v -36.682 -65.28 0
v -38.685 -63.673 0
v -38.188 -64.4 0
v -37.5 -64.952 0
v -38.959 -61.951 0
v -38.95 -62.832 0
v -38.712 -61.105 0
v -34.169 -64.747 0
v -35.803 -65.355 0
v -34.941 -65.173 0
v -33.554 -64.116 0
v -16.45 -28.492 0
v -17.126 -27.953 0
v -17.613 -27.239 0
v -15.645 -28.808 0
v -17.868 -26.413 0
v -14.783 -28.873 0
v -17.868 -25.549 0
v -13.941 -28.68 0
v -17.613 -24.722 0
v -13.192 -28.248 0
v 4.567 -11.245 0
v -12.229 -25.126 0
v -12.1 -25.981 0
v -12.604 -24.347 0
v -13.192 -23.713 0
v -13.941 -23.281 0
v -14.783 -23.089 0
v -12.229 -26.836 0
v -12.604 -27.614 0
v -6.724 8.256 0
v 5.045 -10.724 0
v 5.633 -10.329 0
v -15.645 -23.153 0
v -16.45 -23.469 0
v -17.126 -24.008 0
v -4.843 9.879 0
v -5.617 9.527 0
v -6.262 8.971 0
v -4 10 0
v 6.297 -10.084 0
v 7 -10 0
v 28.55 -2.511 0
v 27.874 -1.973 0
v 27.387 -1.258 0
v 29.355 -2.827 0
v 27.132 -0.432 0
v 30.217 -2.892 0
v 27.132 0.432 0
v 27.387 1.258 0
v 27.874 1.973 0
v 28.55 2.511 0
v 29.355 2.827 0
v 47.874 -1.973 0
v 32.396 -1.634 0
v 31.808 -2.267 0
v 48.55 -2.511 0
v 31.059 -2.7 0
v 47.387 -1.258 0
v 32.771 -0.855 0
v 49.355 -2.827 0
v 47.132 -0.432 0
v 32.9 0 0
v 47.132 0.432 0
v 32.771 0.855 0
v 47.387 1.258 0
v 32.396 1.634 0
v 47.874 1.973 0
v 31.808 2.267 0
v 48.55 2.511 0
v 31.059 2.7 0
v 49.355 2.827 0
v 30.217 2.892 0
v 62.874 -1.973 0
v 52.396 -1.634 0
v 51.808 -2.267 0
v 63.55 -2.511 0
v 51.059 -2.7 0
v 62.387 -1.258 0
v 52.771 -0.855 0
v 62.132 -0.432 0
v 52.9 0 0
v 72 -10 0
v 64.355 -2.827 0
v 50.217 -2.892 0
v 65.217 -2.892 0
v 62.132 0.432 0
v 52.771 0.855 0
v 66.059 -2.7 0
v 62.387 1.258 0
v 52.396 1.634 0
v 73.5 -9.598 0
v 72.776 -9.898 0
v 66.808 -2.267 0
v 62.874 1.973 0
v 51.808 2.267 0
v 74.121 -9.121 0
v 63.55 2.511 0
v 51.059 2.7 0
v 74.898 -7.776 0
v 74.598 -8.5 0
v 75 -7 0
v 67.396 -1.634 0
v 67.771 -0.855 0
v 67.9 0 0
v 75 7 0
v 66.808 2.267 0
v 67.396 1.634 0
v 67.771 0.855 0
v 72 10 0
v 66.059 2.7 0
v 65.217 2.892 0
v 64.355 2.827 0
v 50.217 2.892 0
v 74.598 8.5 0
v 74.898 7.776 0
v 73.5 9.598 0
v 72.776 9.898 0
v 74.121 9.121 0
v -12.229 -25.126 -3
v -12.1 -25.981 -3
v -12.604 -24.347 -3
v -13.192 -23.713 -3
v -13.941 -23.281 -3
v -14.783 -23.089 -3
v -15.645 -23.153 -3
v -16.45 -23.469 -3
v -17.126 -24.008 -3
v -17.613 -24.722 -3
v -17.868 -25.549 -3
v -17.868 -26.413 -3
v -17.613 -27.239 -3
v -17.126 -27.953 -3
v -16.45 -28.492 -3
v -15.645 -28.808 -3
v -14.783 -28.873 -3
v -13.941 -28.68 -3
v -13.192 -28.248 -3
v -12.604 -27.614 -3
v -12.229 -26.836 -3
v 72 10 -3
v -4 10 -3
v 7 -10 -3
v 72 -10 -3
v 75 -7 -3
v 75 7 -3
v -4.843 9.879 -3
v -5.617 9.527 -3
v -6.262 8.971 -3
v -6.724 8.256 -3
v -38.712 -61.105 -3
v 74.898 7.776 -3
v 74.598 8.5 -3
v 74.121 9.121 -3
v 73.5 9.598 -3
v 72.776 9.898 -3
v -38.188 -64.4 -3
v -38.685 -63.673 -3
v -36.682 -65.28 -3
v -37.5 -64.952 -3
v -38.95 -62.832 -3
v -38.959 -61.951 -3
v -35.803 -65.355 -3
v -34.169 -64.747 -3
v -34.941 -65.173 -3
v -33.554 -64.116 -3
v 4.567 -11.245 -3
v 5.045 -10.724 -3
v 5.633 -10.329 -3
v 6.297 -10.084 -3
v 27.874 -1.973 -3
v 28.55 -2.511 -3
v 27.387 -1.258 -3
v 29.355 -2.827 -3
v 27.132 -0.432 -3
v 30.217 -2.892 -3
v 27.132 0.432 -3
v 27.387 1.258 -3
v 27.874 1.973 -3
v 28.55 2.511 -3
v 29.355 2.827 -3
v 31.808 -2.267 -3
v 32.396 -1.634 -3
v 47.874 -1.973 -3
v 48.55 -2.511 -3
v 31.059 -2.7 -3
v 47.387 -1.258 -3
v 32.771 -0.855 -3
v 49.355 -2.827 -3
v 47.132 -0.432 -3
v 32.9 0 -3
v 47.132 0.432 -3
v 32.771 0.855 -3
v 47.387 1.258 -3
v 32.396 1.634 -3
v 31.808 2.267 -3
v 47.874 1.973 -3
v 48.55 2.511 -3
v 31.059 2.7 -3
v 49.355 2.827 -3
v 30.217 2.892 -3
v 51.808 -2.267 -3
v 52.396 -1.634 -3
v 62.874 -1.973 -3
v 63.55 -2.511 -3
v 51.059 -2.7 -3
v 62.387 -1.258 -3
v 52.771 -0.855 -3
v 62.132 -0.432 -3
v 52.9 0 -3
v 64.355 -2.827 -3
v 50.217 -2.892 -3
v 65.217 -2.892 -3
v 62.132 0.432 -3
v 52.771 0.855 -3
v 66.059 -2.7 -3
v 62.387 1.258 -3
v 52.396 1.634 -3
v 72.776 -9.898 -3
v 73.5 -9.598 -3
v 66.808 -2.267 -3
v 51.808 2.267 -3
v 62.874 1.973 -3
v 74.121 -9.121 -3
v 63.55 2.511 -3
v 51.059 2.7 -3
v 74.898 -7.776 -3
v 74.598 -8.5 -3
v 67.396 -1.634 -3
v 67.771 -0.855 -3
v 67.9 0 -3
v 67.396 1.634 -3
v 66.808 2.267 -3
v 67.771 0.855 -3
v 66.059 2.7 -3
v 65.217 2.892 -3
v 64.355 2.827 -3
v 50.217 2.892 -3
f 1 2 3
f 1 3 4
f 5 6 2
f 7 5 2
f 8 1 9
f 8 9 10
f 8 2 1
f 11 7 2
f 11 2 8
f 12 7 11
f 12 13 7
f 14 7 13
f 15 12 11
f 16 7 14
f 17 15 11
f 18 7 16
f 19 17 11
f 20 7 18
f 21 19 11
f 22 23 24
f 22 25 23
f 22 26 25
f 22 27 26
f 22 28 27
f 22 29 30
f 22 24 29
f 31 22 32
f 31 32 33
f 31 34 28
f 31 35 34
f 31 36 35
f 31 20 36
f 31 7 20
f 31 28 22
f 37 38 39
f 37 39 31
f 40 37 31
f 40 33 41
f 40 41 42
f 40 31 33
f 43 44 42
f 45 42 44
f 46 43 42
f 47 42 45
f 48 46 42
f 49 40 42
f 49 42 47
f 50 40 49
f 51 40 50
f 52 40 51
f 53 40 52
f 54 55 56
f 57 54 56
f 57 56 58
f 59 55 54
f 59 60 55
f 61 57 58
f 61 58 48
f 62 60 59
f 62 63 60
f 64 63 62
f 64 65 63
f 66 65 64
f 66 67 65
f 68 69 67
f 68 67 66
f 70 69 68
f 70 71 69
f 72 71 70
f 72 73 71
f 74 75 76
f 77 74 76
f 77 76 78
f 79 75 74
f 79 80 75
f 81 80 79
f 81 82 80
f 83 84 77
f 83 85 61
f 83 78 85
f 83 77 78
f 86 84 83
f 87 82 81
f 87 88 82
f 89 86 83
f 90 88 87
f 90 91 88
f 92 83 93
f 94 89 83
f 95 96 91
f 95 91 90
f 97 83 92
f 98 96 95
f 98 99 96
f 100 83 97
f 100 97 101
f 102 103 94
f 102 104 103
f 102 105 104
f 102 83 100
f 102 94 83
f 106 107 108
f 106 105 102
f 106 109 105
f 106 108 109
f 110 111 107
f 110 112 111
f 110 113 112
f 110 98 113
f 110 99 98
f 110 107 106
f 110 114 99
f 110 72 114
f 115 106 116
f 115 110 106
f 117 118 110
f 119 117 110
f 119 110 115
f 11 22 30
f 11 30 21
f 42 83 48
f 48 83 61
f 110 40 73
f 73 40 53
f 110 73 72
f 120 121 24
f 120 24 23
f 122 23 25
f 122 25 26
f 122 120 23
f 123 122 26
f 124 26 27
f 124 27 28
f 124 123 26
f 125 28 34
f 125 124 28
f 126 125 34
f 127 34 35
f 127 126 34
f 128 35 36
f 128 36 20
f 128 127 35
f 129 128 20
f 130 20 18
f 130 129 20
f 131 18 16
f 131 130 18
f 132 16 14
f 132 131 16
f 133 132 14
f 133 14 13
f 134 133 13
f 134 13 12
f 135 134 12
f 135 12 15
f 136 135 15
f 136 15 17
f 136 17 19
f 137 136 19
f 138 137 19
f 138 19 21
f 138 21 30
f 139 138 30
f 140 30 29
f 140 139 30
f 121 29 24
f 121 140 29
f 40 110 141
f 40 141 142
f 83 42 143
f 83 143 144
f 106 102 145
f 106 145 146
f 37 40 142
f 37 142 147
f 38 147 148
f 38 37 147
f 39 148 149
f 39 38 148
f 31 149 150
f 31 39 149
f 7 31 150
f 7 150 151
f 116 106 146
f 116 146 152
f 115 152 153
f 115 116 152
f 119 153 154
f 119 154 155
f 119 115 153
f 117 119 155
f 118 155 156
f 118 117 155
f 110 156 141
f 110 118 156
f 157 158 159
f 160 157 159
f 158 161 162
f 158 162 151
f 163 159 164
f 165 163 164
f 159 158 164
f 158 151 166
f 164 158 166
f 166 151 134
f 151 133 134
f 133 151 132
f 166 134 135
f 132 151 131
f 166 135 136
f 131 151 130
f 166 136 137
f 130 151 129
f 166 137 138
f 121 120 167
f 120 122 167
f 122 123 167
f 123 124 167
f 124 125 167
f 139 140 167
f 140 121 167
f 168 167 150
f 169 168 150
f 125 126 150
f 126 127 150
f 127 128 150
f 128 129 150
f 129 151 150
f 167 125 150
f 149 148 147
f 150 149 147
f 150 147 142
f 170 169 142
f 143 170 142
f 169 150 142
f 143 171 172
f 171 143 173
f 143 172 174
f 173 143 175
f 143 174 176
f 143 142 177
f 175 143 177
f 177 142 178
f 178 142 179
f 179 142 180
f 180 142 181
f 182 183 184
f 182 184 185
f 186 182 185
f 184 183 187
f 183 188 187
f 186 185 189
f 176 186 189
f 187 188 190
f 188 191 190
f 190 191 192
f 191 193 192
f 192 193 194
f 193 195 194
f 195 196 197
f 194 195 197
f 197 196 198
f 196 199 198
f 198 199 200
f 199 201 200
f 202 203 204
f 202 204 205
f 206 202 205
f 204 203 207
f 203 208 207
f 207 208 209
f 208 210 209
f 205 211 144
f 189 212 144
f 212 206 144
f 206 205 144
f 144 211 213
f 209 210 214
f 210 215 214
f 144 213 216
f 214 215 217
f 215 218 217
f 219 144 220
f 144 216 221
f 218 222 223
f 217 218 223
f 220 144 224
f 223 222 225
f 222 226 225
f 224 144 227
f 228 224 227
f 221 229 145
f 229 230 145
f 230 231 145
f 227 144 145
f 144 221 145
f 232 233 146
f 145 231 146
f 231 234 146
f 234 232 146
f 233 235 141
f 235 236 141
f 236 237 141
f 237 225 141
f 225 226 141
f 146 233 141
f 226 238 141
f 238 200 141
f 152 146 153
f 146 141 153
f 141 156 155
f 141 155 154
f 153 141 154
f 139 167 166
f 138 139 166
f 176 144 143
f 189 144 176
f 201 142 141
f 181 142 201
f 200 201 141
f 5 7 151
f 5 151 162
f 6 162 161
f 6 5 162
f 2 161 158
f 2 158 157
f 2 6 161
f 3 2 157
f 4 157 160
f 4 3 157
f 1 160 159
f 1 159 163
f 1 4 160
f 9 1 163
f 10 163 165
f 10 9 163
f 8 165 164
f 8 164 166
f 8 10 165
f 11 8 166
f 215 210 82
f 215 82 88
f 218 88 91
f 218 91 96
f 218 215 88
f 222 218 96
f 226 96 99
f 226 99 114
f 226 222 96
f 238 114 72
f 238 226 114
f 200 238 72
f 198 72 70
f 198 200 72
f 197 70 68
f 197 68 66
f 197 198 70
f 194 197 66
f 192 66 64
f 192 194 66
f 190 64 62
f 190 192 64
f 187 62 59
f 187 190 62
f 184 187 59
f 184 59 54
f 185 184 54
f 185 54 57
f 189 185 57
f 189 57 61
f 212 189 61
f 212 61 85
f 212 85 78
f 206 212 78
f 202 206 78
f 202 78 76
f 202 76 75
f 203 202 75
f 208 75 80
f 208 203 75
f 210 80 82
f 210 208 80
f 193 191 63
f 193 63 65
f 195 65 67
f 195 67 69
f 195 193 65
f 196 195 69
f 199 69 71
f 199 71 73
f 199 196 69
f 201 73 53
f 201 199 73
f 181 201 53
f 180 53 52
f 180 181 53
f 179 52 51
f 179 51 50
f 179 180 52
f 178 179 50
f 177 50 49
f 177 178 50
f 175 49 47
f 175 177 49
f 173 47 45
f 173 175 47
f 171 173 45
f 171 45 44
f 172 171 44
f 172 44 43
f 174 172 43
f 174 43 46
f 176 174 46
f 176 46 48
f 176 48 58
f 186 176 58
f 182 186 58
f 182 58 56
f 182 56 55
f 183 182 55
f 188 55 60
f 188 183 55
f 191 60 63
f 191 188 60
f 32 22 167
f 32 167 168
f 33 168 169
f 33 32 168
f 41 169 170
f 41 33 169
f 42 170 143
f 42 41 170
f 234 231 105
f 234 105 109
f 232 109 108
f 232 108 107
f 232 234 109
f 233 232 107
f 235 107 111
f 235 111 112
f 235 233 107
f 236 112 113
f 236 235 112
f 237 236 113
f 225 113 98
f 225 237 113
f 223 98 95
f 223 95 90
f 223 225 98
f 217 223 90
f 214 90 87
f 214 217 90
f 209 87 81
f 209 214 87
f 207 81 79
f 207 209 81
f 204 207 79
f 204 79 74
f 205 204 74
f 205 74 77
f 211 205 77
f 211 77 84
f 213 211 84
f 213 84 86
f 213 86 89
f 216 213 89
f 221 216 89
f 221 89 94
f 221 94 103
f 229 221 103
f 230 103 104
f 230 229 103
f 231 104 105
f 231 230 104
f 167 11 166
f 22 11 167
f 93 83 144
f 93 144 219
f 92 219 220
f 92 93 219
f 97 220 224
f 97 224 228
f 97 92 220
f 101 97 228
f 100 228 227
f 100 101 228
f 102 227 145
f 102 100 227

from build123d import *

# Parameters (mm, degrees)
BOSS_EXTRU_1_DEPTH       = 3
D_GAGEMENT_START         = -3
D_GAGEMENT_M51_OUTLINE_R = 2.9
D_GAGEMENT_M51_DEPTH     = 3


# Read off the part's stored shape, not the designer's step: Dégagement M51
with BuildPart() as part:
    # Esquisse1 → Boss.-Extru.1 (new body)
    with BuildSketch(Plane.XY):
        with BuildLine():
            Line((-6.724255553, 8.256356511), (-38.711792489, -61.104708083))
            ThreePointArc((-38.711792489, -61.104708083), (-37.5, -64.951905284), (-33.554116714, -64.115620384))
            Line((-33.554116714, -64.115620384), (4.566579778, -11.24544421))
            ThreePointArc((4.566579778, -11.24544421), (5.633191193, -10.329450677), (7, -10))
            Line((7, -10), (72, -10))
            ThreePointArc((72, -10), (74.121320344, -9.121320344), (75, -7))
            Line((75, -7), (75, 7))
            ThreePointArc((75, 7), (74.121320344, 9.121320344), (72, 10))
            Line((72, 10), (-4, 10))
            ThreePointArc((-4, 10), (-5.617240005, 9.526763694), (-6.724255553, 8.256356511))
        make_face()
    extrude(amount=-BOSS_EXTRU_1_DEPTH)

    # Dégagement M51 outline → Dégagement M51 (cut)
    with BuildSketch(Plane.XY.offset(D_GAGEMENT_START)):
        with Locations((65, 0)):
            Circle(D_GAGEMENT_M51_OUTLINE_R)
        with Locations((50, 0)):
            Circle(D_GAGEMENT_M51_OUTLINE_R)
        with Locations((-15, -25.980762114)):
            Circle(D_GAGEMENT_M51_OUTLINE_R)
        with Locations((30, 0)):
            Circle(D_GAGEMENT_M51_OUTLINE_R)
    extrude(amount=D_GAGEMENT_M51_DEPTH, mode=Mode.SUBTRACT)


solid = part.part
